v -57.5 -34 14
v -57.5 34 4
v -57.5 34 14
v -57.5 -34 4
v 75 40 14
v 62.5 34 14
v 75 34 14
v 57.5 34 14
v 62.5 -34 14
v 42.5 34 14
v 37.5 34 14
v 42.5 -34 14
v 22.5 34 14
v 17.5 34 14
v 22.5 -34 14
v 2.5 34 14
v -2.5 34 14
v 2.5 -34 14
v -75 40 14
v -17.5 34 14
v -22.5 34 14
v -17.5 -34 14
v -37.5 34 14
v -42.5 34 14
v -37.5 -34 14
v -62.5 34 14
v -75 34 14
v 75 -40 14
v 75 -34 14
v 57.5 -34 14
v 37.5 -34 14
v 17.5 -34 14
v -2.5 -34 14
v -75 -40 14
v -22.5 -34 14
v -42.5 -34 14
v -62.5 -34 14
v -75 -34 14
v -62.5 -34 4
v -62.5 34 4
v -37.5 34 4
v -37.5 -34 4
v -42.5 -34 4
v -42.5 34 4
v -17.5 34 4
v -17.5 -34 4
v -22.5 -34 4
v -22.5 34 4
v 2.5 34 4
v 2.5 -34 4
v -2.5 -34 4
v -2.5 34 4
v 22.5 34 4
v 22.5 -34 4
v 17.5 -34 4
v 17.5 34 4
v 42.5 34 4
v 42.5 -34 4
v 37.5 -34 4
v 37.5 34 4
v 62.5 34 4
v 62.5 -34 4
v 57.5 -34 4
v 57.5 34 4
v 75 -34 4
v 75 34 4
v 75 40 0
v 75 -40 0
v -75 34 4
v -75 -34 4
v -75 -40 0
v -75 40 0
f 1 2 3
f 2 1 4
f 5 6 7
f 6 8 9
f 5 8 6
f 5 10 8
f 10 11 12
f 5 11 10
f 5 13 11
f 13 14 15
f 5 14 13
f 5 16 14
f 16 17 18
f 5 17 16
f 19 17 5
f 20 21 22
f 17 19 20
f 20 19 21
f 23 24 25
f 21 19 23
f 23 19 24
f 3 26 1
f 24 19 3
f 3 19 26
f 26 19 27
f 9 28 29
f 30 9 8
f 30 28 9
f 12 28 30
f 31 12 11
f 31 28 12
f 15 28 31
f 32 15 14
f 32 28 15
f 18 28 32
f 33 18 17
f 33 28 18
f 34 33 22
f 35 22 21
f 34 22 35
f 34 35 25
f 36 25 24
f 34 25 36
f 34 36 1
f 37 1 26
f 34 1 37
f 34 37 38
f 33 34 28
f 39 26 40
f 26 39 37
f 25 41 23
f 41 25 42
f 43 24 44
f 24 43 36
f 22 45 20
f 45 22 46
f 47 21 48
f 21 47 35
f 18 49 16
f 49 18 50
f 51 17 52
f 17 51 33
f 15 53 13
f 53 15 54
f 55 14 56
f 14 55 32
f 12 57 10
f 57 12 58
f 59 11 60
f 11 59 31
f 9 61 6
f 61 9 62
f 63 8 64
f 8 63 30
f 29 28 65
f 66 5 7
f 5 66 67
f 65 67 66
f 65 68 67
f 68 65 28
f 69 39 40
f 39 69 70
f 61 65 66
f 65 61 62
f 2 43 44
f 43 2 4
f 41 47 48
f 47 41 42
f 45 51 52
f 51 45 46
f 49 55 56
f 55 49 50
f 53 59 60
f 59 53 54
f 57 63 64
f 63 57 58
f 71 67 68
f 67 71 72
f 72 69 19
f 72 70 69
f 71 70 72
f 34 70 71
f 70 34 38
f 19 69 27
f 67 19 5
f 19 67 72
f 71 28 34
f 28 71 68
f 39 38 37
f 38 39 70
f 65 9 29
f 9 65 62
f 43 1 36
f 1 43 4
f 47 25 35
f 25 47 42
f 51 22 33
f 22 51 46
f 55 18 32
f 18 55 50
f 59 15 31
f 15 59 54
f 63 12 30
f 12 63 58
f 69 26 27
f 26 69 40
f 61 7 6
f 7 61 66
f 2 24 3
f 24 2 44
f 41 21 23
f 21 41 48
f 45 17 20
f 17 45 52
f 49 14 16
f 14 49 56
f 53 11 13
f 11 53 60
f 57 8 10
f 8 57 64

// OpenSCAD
$fn = 32;

// ----------------------------------------------------------------------
// Rib frame 150 x 80 x 14
// 7 ribs at 20 mm pitch
// ----------------------------------------------------------------------

// --- parameters (mm) ---
frame = [150, 80, 4];  // base plate size (x, y, z)
rail_w = 6;            // side rail width
ribs = 7;              // number of ribs
rib_t = 5;             // rib thickness
rib_h = 10;            // rib height above the base plate
pitch = 20;            // pitch between rib centres

// --- derived feature positions (mm) ---
span = (ribs - 1) * pitch;          // = 120   distance between the outer ribs
origin_x = -span / 2;               // = -60   X of the first rib
rib_len = frame[1] - 2 * rail_w + 2;  // = 70   rib length, 1 mm into each rail
feature_centers = [
  [origin_x + 0 * pitch, 0],
  [origin_x + 1 * pitch, 0],
  [origin_x + 2 * pitch, 0],
  [origin_x + 3 * pitch, 0],
  [origin_x + 4 * pitch, 0],
  [origin_x + 5 * pitch, 0],
  [origin_x + 6 * pitch, 0]
];   // rib centre line, drives the rib loop

// base plate, two side rails, then the ribs read straight off feature_centers
union() {
  translate([-frame[0] / 2, -frame[1] / 2, 0]) cube(frame);
  translate([-frame[0] / 2, -frame[1] / 2, 0]) cube([frame[0], rail_w, frame[2] + rib_h]);
  translate([-frame[0] / 2, frame[1] / 2 - rail_w, 0]) cube([frame[0], rail_w, frame[2] + rib_h]);
  for (centre = feature_centers)
    translate([centre[0] - rib_t / 2, centre[1] - rib_len / 2, frame[2] - 1])
      cube([rib_t, rib_len, rib_h + 1]);
}
